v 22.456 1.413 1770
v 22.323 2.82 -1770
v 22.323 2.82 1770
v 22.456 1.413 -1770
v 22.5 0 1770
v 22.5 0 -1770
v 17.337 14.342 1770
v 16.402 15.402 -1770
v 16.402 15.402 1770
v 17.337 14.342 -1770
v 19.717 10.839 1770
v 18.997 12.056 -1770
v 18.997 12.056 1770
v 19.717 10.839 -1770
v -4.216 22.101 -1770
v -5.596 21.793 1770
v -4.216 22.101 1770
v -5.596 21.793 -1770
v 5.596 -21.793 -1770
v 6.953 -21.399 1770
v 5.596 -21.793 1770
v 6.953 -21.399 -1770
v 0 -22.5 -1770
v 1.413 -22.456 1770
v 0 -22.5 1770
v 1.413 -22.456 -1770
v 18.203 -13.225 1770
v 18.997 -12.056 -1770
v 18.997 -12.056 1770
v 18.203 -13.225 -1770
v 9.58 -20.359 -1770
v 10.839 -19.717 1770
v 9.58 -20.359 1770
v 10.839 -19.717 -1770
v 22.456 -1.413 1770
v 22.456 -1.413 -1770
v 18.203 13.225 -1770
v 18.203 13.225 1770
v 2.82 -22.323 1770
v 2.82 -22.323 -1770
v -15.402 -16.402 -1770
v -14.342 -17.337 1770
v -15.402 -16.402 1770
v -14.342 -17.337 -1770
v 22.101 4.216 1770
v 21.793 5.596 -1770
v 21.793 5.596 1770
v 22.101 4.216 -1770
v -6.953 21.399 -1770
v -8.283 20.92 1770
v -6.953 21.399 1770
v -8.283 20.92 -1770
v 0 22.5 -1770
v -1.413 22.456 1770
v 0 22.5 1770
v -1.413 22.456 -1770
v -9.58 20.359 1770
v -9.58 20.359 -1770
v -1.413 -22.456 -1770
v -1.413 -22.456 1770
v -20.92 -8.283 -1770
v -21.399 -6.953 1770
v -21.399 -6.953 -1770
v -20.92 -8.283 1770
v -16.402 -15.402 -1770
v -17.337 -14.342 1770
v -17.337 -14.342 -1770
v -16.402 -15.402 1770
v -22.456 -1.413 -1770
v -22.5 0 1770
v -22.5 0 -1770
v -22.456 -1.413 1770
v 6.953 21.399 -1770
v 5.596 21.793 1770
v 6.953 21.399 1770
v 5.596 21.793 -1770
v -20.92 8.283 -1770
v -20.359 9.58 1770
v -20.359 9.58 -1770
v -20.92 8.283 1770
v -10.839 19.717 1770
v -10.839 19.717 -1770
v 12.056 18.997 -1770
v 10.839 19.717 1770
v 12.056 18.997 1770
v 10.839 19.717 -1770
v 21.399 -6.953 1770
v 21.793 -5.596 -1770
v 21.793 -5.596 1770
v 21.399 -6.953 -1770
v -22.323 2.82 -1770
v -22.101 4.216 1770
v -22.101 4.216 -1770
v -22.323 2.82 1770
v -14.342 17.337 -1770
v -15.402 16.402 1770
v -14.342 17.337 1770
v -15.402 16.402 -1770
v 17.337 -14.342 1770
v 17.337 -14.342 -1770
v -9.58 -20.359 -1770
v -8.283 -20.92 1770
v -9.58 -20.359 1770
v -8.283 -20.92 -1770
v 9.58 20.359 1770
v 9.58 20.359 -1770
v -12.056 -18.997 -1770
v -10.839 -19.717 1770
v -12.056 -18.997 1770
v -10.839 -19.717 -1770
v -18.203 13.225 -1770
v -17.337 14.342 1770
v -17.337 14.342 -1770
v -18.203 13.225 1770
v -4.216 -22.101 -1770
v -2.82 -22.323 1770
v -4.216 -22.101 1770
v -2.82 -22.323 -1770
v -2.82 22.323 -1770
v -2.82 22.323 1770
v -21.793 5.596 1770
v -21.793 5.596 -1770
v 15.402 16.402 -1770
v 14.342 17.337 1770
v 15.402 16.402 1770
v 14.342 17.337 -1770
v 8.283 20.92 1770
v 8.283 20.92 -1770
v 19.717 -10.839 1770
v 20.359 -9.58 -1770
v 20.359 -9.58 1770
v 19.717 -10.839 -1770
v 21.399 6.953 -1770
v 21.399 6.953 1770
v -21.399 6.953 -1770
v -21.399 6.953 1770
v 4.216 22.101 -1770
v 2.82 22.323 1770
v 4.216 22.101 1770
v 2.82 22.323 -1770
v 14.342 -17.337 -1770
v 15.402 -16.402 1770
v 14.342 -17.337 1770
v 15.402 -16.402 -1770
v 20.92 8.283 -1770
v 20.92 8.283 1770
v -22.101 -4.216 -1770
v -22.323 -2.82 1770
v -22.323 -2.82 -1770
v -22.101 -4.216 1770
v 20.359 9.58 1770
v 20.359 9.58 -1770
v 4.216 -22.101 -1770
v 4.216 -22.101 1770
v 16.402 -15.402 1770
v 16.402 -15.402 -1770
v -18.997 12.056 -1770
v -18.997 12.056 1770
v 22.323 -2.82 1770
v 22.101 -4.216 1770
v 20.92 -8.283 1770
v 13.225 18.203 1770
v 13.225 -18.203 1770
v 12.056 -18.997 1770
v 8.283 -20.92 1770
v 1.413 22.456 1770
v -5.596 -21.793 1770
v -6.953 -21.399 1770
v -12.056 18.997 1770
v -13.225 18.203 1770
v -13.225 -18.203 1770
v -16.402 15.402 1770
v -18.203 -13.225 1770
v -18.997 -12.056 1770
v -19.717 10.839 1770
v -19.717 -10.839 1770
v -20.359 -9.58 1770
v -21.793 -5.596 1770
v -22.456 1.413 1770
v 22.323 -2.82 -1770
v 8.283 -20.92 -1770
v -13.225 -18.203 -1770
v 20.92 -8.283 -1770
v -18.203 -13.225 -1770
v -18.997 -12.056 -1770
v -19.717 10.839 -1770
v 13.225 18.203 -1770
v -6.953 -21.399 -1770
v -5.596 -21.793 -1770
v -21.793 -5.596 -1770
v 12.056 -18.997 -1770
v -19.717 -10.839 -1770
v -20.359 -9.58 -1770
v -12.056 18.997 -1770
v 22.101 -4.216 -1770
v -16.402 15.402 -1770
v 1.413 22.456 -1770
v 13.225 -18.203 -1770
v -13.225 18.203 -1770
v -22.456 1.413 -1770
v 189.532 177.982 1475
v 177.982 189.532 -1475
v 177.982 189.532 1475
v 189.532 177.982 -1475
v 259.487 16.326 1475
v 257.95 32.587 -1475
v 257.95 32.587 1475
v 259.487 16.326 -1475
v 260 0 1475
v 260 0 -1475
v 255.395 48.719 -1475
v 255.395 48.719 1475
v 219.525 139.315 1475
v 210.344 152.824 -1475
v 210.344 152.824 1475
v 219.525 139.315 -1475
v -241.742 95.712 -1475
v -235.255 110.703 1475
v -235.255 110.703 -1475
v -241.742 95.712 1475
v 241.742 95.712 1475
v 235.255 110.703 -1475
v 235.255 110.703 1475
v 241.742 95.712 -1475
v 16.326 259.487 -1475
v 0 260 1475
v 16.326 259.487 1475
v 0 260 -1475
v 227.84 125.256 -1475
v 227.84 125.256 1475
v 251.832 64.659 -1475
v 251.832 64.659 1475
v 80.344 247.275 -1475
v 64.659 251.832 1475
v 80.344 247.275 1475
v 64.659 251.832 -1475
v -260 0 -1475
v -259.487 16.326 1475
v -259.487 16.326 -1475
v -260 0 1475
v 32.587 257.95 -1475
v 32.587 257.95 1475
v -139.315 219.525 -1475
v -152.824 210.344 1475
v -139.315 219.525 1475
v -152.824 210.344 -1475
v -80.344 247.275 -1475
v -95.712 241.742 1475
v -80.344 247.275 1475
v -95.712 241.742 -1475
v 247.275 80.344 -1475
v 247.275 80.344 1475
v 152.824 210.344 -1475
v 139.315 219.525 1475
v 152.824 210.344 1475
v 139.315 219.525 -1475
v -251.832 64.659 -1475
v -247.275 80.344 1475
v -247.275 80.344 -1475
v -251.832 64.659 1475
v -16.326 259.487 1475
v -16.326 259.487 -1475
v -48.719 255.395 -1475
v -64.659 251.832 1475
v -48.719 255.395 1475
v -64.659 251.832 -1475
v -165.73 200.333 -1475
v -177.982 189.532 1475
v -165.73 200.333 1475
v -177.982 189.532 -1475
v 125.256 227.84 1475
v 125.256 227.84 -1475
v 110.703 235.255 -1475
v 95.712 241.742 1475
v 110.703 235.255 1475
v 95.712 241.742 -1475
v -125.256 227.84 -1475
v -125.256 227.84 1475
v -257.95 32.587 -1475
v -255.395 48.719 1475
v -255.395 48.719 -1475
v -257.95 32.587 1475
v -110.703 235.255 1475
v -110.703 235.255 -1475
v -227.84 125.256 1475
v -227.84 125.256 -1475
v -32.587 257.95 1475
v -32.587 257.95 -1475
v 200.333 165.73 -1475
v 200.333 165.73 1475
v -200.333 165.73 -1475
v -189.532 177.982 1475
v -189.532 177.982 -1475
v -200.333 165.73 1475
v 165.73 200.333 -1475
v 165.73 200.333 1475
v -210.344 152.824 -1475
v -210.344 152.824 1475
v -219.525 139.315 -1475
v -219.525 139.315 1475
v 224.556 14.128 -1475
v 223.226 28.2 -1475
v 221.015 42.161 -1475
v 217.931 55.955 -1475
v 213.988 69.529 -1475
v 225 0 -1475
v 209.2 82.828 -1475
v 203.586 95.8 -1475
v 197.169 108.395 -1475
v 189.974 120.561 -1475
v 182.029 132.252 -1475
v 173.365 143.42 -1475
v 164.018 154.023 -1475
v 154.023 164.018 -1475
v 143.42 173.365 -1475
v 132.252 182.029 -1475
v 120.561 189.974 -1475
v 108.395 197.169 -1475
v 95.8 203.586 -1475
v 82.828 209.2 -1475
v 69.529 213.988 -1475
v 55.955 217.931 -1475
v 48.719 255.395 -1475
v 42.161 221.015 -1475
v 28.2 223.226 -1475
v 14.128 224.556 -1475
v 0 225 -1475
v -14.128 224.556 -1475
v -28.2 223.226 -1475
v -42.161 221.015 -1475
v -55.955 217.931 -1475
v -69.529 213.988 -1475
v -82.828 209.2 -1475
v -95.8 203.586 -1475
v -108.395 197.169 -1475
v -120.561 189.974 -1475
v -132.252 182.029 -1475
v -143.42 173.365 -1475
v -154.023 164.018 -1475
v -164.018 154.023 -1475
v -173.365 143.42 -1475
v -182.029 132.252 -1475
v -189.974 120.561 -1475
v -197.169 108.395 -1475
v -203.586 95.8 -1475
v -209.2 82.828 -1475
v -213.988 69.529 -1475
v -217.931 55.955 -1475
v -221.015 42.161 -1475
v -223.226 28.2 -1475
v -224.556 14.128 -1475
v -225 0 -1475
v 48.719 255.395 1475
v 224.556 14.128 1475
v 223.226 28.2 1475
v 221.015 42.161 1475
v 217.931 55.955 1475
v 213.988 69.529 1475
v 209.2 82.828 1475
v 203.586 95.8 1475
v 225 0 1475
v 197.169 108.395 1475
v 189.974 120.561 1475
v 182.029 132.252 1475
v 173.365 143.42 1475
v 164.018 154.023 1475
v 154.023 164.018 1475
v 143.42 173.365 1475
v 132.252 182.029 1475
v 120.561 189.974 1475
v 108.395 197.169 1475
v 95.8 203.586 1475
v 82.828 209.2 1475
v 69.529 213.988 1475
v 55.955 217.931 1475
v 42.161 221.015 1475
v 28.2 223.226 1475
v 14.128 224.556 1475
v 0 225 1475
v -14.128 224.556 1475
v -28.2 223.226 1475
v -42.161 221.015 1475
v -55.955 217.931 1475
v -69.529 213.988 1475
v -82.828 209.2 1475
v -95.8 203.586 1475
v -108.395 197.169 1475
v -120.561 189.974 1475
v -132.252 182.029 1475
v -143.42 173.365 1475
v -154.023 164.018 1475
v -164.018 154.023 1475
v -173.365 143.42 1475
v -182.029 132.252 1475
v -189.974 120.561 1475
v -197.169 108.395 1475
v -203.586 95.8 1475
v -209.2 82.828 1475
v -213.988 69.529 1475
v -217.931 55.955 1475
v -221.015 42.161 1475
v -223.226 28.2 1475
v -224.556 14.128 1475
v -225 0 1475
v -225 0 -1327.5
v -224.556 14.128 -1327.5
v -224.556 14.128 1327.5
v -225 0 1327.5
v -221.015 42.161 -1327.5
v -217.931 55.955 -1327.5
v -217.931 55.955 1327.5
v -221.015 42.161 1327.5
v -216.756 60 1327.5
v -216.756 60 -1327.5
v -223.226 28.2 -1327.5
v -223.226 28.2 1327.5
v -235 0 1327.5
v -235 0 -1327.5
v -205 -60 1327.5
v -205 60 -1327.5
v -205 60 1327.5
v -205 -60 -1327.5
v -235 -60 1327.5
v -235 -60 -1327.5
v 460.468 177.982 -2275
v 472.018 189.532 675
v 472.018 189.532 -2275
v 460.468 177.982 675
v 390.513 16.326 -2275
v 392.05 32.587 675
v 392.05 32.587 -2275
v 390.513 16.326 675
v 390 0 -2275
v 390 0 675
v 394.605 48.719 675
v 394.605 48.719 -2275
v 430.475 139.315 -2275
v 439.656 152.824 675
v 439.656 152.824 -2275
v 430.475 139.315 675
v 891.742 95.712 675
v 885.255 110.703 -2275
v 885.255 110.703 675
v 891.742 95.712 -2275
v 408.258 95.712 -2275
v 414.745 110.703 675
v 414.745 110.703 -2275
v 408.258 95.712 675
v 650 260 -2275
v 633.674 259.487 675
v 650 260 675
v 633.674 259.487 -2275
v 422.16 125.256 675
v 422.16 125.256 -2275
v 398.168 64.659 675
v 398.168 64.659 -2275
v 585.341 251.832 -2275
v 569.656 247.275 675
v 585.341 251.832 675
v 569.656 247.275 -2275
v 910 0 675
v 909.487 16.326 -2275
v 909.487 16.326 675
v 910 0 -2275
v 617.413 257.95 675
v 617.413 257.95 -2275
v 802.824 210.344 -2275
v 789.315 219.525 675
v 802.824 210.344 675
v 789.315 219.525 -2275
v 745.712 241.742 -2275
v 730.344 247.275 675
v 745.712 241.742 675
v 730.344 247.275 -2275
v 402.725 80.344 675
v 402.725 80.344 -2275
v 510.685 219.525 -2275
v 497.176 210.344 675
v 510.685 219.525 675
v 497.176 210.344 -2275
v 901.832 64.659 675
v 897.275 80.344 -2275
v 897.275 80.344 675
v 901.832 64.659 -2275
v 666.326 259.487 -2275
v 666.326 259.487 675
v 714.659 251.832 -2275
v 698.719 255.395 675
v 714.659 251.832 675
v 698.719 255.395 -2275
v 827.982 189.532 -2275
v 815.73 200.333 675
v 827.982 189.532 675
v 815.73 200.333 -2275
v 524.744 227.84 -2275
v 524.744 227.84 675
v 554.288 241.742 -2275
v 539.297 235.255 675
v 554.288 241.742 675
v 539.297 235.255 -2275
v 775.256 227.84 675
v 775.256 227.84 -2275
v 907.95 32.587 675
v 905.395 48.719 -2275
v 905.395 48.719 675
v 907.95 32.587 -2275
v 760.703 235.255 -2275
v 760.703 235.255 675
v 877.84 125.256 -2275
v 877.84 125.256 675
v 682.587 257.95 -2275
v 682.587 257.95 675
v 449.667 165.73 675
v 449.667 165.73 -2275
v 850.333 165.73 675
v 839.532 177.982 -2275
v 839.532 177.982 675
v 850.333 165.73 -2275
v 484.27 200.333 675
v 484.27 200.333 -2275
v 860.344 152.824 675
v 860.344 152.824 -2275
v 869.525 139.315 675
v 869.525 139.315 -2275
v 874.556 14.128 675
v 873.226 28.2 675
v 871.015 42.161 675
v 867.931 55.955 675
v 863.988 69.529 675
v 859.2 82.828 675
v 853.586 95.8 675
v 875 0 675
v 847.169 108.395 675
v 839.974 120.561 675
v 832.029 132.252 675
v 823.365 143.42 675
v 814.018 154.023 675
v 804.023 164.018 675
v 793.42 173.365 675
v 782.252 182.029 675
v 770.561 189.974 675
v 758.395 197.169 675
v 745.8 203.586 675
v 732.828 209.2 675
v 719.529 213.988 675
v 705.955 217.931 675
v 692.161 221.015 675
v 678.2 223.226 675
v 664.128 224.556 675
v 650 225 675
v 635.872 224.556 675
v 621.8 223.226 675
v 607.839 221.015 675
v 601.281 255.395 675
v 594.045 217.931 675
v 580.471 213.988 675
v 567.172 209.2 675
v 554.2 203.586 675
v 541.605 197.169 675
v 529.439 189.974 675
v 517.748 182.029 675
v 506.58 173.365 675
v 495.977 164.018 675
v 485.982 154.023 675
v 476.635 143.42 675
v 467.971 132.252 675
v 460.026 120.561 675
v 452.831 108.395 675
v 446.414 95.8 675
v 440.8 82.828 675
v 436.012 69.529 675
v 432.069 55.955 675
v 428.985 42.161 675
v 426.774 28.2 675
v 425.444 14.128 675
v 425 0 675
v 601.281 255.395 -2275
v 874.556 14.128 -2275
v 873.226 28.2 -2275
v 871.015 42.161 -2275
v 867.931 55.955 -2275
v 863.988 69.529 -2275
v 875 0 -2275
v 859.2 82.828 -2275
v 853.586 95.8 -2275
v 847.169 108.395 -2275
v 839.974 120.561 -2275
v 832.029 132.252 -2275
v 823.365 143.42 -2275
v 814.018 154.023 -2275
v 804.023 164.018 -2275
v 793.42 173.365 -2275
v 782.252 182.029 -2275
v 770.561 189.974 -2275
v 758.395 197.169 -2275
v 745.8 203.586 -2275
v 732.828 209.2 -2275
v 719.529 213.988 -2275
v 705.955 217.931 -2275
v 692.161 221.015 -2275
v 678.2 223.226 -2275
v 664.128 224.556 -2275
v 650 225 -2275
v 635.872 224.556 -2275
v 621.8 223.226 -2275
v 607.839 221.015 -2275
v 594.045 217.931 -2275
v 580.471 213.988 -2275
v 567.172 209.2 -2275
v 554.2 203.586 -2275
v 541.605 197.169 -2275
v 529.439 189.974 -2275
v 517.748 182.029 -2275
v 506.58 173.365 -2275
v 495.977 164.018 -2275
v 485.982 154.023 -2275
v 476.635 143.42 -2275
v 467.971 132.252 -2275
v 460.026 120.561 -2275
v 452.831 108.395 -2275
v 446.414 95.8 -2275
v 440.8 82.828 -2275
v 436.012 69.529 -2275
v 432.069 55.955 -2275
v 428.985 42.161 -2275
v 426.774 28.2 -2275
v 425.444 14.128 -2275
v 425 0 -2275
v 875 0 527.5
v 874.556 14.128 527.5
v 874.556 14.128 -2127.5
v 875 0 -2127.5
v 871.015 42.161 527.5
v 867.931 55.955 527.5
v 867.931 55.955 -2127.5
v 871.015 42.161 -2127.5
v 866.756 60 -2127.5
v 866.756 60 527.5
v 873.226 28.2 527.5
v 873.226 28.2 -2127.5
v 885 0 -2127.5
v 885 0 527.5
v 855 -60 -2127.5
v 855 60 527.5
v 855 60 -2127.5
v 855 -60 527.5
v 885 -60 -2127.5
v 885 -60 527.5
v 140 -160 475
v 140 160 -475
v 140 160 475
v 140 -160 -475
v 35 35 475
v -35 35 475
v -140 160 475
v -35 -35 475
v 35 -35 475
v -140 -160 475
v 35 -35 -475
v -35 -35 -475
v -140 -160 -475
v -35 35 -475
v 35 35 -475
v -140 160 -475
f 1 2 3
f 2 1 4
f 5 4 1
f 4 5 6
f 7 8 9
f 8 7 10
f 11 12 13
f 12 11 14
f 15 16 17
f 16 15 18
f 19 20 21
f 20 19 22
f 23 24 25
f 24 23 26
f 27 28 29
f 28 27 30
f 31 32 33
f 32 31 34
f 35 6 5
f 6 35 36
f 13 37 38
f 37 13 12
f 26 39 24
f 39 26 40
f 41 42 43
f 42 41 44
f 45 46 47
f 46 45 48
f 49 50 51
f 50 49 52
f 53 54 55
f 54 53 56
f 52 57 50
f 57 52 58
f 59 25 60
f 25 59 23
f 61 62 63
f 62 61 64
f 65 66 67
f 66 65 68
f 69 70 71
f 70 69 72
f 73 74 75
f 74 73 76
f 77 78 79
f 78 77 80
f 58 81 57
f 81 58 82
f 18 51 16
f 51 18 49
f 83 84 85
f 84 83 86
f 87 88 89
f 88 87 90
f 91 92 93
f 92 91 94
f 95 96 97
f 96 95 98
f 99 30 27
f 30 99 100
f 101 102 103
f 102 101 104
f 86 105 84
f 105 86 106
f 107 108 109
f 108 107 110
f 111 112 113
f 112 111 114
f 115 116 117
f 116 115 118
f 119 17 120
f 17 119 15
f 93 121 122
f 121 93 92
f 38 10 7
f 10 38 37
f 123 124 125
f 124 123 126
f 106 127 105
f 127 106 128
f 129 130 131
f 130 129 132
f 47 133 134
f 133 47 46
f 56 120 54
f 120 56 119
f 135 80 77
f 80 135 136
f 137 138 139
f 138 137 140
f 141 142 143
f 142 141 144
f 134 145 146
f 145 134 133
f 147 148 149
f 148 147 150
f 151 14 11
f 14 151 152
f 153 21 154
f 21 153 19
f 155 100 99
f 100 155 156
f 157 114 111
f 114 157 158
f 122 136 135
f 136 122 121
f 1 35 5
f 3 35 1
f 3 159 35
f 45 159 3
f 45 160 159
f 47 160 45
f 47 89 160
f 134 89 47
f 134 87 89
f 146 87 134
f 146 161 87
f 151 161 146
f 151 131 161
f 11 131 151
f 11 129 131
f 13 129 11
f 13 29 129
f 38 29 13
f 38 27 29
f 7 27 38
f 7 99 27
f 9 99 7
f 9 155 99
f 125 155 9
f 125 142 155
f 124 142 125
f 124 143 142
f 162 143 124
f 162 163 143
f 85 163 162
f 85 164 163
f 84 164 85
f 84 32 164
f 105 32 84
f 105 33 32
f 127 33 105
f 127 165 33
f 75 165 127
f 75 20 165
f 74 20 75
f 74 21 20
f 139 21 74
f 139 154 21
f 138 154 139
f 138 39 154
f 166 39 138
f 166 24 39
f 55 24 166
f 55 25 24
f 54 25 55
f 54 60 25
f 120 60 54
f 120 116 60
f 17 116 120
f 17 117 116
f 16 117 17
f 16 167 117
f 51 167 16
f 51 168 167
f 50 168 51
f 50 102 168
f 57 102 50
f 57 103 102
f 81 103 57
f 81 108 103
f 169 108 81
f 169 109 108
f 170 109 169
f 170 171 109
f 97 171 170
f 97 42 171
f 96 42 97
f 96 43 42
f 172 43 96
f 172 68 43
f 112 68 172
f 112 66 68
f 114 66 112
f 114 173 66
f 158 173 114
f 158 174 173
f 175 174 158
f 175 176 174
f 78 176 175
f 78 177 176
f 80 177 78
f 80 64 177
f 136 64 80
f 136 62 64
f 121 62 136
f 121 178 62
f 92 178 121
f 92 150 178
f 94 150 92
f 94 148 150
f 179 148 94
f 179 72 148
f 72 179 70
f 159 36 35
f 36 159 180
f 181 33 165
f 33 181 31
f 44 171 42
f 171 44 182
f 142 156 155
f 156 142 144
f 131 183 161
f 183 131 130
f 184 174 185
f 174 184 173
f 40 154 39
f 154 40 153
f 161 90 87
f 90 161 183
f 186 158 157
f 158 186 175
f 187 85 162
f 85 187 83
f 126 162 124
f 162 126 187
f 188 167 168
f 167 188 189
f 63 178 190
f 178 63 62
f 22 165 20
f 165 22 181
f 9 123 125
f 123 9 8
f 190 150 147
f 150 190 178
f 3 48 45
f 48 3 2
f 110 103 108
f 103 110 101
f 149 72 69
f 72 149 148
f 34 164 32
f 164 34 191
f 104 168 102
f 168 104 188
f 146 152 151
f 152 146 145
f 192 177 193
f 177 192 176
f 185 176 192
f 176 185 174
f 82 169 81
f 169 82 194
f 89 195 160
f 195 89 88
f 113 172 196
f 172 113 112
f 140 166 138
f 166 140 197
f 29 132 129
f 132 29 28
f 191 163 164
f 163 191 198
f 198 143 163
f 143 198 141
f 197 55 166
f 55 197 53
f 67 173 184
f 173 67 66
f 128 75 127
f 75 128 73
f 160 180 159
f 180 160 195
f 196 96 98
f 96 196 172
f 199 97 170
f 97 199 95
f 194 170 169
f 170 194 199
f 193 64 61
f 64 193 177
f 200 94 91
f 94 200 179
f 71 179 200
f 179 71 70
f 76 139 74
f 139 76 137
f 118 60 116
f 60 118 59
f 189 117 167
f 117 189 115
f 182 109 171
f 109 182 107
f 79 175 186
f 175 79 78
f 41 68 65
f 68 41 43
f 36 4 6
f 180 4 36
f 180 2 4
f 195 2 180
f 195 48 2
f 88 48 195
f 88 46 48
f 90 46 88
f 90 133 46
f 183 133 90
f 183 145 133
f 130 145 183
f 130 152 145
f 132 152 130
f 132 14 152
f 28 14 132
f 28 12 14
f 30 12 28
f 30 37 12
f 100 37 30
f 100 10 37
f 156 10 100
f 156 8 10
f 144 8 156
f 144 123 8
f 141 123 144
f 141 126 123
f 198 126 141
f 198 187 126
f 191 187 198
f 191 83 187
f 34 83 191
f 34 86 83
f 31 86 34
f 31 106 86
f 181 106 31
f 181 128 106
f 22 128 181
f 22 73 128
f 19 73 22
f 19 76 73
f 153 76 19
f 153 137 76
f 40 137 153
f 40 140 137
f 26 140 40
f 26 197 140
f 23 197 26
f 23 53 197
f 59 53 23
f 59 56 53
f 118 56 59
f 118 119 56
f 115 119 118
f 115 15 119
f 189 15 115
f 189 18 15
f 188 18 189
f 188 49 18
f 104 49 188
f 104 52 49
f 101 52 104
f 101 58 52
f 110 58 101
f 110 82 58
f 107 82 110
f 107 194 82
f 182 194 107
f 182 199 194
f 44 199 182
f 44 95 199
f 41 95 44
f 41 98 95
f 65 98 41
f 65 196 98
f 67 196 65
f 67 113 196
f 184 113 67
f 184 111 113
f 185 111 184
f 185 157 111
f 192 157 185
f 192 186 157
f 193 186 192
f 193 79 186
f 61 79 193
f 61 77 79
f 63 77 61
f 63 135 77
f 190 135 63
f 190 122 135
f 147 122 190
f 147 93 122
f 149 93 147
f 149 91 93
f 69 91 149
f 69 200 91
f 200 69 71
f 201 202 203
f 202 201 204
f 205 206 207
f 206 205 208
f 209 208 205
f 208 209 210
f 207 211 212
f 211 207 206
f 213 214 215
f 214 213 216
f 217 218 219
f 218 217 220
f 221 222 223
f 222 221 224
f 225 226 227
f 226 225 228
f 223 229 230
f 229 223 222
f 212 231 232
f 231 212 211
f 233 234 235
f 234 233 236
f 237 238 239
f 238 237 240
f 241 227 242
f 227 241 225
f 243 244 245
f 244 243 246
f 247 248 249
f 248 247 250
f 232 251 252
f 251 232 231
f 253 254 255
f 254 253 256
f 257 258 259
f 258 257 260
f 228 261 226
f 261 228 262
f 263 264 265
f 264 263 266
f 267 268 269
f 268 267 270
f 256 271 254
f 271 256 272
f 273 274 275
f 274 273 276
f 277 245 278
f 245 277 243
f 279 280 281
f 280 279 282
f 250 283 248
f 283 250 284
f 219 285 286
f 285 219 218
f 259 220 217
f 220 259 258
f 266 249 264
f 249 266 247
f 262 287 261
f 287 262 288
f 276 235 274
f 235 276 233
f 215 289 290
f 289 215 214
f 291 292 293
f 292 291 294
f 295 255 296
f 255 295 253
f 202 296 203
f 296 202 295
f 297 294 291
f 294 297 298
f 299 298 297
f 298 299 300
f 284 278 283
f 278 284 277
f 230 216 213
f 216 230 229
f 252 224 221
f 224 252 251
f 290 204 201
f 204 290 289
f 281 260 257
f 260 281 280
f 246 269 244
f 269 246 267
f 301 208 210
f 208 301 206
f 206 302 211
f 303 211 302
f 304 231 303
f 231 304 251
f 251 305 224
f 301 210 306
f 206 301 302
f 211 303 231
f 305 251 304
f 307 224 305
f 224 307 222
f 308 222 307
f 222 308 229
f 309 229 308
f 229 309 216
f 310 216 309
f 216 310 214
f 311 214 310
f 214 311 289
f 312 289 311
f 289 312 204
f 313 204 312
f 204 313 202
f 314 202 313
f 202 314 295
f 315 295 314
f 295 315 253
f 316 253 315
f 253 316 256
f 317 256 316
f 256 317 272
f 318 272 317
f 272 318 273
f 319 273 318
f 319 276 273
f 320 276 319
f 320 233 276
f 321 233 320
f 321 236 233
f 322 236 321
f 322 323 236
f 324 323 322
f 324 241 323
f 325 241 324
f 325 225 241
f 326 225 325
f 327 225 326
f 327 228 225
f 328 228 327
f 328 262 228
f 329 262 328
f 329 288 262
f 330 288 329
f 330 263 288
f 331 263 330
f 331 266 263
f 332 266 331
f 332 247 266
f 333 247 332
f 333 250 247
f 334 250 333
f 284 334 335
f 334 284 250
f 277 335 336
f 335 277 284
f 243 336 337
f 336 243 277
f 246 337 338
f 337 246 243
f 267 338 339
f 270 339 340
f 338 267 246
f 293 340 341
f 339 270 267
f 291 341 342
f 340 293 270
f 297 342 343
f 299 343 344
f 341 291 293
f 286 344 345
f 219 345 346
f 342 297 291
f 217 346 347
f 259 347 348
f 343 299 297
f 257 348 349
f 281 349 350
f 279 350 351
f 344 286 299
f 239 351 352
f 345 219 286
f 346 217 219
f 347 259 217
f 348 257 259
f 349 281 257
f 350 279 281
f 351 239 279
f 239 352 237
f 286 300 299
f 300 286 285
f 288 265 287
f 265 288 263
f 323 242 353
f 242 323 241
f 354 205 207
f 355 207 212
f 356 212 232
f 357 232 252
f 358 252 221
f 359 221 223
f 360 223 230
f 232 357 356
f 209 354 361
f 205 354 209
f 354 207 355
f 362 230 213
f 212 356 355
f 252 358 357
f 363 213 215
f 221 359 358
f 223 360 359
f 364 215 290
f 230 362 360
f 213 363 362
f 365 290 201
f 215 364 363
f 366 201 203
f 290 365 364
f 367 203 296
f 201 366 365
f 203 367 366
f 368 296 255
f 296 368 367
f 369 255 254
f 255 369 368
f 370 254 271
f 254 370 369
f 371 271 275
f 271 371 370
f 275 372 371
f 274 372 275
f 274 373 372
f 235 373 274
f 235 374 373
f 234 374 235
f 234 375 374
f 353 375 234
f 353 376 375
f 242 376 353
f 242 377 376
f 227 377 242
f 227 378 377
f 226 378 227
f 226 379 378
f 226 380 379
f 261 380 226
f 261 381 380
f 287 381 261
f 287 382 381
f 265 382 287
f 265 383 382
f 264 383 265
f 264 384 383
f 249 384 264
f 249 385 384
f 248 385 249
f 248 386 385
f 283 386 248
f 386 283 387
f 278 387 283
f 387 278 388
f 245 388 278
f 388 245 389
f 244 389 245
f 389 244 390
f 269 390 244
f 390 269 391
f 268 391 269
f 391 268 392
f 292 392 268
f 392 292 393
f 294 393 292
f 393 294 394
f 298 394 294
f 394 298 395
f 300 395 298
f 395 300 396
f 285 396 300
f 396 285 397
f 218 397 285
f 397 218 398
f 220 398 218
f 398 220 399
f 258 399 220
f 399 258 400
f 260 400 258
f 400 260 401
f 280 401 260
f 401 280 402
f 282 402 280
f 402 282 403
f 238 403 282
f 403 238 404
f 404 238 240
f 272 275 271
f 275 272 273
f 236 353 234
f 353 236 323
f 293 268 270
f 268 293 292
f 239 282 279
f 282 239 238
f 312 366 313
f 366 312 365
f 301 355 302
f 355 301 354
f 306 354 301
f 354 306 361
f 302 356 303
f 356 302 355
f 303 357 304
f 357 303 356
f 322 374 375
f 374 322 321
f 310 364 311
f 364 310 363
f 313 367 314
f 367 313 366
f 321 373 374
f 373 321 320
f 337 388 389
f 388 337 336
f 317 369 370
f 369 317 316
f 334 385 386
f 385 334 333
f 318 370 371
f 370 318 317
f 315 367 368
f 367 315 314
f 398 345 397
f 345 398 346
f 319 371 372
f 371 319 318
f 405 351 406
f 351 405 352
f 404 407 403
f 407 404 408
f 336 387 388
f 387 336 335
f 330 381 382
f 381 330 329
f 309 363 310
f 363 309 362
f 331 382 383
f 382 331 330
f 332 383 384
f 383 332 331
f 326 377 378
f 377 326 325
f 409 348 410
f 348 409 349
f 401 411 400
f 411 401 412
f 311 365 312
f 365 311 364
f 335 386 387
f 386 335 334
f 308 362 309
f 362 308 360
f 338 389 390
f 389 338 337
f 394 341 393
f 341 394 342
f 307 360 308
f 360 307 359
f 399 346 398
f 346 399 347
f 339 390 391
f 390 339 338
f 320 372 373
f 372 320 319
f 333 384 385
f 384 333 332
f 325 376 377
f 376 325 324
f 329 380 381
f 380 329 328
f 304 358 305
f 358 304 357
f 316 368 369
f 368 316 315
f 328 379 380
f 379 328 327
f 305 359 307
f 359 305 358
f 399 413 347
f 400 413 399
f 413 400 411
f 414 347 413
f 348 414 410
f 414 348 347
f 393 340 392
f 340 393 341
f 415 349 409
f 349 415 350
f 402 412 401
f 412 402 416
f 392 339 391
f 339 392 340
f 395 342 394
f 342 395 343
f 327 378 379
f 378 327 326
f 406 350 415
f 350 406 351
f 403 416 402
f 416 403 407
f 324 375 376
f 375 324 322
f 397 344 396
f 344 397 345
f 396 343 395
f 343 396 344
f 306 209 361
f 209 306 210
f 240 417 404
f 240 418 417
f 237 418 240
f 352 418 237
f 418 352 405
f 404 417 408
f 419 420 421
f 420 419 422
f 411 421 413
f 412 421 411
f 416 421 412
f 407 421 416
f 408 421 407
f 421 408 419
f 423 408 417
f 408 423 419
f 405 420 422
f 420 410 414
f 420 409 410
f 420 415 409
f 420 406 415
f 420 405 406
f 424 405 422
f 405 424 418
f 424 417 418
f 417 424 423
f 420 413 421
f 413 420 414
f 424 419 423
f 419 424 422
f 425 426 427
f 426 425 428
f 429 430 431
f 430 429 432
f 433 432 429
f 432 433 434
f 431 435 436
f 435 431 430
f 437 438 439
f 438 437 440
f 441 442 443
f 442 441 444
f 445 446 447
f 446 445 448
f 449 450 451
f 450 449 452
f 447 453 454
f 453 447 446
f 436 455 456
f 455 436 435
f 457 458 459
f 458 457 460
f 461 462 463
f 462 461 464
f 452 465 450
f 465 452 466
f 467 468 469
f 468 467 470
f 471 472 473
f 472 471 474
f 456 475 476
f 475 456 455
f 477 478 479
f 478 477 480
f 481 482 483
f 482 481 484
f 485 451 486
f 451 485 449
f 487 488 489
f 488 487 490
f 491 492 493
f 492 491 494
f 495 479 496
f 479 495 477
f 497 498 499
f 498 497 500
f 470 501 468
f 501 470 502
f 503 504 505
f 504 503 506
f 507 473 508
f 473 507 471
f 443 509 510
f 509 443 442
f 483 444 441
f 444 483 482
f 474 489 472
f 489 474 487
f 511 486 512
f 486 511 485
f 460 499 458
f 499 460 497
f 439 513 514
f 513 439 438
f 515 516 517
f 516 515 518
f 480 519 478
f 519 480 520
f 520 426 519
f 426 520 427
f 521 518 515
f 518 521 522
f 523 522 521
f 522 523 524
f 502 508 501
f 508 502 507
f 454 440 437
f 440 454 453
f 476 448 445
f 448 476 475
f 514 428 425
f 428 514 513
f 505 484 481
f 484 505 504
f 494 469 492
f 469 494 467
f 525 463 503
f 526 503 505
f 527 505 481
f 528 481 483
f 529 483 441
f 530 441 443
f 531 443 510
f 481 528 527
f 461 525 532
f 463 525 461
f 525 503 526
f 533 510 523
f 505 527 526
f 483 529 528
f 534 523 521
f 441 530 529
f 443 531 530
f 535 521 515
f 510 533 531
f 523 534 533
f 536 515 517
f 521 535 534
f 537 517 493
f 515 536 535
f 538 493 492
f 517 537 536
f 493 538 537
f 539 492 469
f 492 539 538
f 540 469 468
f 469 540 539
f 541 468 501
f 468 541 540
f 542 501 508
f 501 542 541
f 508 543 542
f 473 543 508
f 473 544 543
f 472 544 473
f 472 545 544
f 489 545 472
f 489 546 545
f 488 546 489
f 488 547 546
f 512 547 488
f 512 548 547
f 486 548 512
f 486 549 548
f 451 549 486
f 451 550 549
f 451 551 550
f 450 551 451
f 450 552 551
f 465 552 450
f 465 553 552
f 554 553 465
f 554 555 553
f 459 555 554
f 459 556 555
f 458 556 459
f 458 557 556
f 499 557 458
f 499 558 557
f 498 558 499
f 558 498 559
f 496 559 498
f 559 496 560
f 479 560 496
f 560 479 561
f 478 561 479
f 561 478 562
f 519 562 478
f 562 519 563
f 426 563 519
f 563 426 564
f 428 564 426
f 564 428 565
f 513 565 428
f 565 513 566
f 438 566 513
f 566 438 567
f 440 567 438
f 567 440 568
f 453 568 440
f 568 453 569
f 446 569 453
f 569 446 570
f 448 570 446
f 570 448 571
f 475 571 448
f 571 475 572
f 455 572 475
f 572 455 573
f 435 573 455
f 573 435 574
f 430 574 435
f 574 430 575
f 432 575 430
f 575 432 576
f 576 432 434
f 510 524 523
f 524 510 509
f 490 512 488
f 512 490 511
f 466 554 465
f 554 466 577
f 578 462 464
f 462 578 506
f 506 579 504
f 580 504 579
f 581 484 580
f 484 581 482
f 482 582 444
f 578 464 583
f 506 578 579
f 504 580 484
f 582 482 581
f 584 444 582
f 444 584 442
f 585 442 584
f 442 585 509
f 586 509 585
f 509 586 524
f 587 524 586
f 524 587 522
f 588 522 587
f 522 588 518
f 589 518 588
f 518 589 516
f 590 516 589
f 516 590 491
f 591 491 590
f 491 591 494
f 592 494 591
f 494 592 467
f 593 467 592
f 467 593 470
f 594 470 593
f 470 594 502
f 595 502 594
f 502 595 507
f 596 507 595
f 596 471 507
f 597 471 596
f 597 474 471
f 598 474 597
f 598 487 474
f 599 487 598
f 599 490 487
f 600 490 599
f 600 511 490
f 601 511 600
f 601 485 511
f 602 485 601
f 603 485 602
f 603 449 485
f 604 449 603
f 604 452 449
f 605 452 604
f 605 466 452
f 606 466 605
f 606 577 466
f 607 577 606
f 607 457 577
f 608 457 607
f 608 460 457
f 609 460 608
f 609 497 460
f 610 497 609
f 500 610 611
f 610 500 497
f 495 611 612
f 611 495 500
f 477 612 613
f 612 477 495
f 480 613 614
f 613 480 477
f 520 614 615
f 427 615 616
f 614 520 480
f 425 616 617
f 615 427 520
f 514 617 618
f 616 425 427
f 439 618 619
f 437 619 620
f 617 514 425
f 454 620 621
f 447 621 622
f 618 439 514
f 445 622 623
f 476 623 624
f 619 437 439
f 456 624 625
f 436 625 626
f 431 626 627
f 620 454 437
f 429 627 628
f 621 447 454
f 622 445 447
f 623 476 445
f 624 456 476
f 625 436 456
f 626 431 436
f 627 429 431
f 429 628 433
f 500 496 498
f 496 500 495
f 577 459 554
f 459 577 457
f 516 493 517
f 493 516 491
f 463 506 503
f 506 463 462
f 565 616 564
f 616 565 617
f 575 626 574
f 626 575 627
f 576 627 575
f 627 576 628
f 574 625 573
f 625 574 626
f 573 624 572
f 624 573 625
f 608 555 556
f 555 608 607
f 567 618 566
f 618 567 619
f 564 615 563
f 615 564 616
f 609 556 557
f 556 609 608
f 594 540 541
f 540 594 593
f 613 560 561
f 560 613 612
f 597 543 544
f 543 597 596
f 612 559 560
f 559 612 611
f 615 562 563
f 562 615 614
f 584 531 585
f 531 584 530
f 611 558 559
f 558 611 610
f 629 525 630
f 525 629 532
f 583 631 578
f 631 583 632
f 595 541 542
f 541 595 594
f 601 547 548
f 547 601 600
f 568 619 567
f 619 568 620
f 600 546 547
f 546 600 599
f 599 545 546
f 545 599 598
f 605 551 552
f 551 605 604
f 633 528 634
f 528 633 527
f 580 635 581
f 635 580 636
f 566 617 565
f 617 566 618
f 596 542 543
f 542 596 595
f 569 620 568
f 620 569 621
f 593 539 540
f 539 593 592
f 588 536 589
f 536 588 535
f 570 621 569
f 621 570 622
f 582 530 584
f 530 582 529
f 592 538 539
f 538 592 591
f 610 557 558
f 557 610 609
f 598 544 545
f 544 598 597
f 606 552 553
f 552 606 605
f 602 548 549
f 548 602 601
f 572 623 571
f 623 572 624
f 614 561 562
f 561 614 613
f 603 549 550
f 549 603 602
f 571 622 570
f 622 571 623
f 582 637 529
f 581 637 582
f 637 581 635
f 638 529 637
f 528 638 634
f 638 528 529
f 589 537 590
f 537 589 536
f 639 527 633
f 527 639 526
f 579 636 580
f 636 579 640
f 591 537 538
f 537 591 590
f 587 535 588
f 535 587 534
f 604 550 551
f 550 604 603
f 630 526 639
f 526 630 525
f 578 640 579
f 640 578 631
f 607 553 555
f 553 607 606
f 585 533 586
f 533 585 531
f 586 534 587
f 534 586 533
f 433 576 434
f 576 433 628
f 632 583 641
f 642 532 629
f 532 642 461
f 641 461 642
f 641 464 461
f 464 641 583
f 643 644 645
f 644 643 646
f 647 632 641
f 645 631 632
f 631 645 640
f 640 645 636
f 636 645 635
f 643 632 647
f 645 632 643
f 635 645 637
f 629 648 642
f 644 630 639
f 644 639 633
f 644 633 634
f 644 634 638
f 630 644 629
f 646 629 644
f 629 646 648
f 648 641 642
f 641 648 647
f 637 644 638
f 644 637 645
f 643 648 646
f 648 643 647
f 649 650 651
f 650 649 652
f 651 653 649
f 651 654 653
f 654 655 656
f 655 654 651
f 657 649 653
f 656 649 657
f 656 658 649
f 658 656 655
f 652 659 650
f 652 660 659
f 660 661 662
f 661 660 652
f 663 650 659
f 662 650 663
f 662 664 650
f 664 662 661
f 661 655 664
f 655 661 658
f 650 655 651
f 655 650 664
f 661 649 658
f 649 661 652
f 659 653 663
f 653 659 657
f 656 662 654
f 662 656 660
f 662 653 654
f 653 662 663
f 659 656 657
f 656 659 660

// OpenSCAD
// ============================================================================
// PROJECT: XXXG-00W0 WING GUNDAM ZERO EW - WEAPON FABRICATION CORES
// COMPONENT VAULT: BANDAI CAST RUNNER D - TWIN BUSTER RIFLE CHASSIS HOUSINGS
// ENGINE ADAPTATION: STRESS-INDUCED THERMOACOUSTIC MATRIX COOLING RETROFIT
// CIRCUIT RULES: FULL SQUARE-WAVE RETROVECTORS & CAST RUNNER CORE AMMO DRIVERS
// ============================================================================

$fn = 100; // Circular fragment resolution count

// Global Tactical Sizing Metrics (1:1 Metrics for an 16.7-Meter Airframe)
rifle_total_length = 5900;              // Total longitudinal barrel weapon axis (mm)
variable_bore_diameter = 420;          // Core 16.5-inch plasma induction path (mm)
armor_chassis_wall = 50;                // Thick TiAl protective shell casing (mm)
power_rail_track_width = 120;           // Sub-surface 4oz copper delivery rail (mm)
pzt_layer_thickness = 15;               // Piezoelectric harvesting crystal array (mm)

module Runner_D_Rifle_Forge() {
    // Master Material Feed Bar (Feeds molten magma from Siphon Forge)
    color([0.25, 0.25, 0.28]) {
        cylinder(h = rifle_total_length * 0.6, d = 45, center = true);
        // Direct injection gates feeding straight to part cavities
        translate() rotate() cylinder(h = 600, d = 25);
        translate([0, 0, -1200]) rotate() cylinder(h = 600, d = 25);
    }
    
    // Instantiate Scaled Part Cavities (Replicating Manual Sprues exactly)
    Cast_Twin_Buster_Rifle_Sections();
}

module Cast_Twin_Buster_Rifle_Sections() {
    // ---- PART D1: MAIN RIFLE MAIN HULL CASING (LEFT HALF-SHELL) ---- [From Page 8, Step 10]
    translate() color([0.5, 0.5, 0.55]) {
        difference() {
            // Main weapon structural barrel enclosure block
            cylinder(h = rifle_total_length * 0.5, d = variable_bore_diameter + (armor_chassis_wall * 2), center = true);
            
            // Core weapon bore path (Six-stage induction plasma loop chamber)
            cylinder(h = rifle_total_length * 0.55, d = variable_bore_diameter, center = true);
            
            // Sub-surface cut out for embedded PZT / micro-Peltier thermoacoustic tracks
            cylinder(h = rifle_total_length * 0.52, d = variable_bore_diameter + pzt_layer_thickness * 2, center = true);
            
            // Slice mold vector to form an asymmetrical mating part shell
            translate([0, -variable_bore_diameter, 0])
                cube([variable_bore_diameter * 2, variable_bore_diameter * 2, rifle_total_length], center = true);
        }
        
        // INTEGRATED 4OZ POWER DELIVERY RAILS [Cast directly into the frame walls]
        color([1.0, 0.73, 0.2]) {
            translate([-(variable_bore_diameter/2 + 10), 0, 0])
                cube([30, power_rail_track_width, rifle_total_length * 0.45], center = true);
        }
    }
    
    // ---- PART D2: MAIN RIFLE MAIN HULL CASING (RIGHT HALF-SHELL) ---- [From Page 8, Step 10]
    translate([650, 0, -800]) rotate([0, 180, 0]) color([0.5, 0.5, 0.55]) {
        difference() {
            cylinder(h = rifle_total_length * 0.5, d = variable_bore_diameter + (armor_chassis_wall * 2), center = true);
            cylinder(h = rifle_total_length * 0.55, d = variable_bore_diameter, center = true);
            cylinder(h = rifle_total_length * 0.52, d = variable_bore_diameter + pzt_layer_thickness * 2, center = true);
            translate([0, -variable_bore_diameter, 0])
                cube([variable_bore_diameter * 2, variable_bore_diameter * 2, rifle_total_length], center = true);
        }
        
        color([1.0, 0.73, 0.2]) {
            translate([-(variable_bore_diameter/2 + 10), 0, 0])
                cube([30, power_rail_track_width, rifle_total_length * 0.45], center = true);
        }
    }

    // ---- PART D4: LOWER SLIDING GRIP & FOREARM COUPLING BLOCK ---- [From Page 8, Step 10]
    translate() color([0.3, 0.3, 0.32]) {
        difference() {
            // Rigid interface coupler that locks into the forearm skeletal frame
            cube([280, 320, 950], center = true);
            // Internal path routing the high-amperage telemetric bus connector
            cube([70, 70, 1000], center = true);
        }
    }
}

// Render Master Assembly to Parameter Workspace
Runner_D_Rifle_Forge();
